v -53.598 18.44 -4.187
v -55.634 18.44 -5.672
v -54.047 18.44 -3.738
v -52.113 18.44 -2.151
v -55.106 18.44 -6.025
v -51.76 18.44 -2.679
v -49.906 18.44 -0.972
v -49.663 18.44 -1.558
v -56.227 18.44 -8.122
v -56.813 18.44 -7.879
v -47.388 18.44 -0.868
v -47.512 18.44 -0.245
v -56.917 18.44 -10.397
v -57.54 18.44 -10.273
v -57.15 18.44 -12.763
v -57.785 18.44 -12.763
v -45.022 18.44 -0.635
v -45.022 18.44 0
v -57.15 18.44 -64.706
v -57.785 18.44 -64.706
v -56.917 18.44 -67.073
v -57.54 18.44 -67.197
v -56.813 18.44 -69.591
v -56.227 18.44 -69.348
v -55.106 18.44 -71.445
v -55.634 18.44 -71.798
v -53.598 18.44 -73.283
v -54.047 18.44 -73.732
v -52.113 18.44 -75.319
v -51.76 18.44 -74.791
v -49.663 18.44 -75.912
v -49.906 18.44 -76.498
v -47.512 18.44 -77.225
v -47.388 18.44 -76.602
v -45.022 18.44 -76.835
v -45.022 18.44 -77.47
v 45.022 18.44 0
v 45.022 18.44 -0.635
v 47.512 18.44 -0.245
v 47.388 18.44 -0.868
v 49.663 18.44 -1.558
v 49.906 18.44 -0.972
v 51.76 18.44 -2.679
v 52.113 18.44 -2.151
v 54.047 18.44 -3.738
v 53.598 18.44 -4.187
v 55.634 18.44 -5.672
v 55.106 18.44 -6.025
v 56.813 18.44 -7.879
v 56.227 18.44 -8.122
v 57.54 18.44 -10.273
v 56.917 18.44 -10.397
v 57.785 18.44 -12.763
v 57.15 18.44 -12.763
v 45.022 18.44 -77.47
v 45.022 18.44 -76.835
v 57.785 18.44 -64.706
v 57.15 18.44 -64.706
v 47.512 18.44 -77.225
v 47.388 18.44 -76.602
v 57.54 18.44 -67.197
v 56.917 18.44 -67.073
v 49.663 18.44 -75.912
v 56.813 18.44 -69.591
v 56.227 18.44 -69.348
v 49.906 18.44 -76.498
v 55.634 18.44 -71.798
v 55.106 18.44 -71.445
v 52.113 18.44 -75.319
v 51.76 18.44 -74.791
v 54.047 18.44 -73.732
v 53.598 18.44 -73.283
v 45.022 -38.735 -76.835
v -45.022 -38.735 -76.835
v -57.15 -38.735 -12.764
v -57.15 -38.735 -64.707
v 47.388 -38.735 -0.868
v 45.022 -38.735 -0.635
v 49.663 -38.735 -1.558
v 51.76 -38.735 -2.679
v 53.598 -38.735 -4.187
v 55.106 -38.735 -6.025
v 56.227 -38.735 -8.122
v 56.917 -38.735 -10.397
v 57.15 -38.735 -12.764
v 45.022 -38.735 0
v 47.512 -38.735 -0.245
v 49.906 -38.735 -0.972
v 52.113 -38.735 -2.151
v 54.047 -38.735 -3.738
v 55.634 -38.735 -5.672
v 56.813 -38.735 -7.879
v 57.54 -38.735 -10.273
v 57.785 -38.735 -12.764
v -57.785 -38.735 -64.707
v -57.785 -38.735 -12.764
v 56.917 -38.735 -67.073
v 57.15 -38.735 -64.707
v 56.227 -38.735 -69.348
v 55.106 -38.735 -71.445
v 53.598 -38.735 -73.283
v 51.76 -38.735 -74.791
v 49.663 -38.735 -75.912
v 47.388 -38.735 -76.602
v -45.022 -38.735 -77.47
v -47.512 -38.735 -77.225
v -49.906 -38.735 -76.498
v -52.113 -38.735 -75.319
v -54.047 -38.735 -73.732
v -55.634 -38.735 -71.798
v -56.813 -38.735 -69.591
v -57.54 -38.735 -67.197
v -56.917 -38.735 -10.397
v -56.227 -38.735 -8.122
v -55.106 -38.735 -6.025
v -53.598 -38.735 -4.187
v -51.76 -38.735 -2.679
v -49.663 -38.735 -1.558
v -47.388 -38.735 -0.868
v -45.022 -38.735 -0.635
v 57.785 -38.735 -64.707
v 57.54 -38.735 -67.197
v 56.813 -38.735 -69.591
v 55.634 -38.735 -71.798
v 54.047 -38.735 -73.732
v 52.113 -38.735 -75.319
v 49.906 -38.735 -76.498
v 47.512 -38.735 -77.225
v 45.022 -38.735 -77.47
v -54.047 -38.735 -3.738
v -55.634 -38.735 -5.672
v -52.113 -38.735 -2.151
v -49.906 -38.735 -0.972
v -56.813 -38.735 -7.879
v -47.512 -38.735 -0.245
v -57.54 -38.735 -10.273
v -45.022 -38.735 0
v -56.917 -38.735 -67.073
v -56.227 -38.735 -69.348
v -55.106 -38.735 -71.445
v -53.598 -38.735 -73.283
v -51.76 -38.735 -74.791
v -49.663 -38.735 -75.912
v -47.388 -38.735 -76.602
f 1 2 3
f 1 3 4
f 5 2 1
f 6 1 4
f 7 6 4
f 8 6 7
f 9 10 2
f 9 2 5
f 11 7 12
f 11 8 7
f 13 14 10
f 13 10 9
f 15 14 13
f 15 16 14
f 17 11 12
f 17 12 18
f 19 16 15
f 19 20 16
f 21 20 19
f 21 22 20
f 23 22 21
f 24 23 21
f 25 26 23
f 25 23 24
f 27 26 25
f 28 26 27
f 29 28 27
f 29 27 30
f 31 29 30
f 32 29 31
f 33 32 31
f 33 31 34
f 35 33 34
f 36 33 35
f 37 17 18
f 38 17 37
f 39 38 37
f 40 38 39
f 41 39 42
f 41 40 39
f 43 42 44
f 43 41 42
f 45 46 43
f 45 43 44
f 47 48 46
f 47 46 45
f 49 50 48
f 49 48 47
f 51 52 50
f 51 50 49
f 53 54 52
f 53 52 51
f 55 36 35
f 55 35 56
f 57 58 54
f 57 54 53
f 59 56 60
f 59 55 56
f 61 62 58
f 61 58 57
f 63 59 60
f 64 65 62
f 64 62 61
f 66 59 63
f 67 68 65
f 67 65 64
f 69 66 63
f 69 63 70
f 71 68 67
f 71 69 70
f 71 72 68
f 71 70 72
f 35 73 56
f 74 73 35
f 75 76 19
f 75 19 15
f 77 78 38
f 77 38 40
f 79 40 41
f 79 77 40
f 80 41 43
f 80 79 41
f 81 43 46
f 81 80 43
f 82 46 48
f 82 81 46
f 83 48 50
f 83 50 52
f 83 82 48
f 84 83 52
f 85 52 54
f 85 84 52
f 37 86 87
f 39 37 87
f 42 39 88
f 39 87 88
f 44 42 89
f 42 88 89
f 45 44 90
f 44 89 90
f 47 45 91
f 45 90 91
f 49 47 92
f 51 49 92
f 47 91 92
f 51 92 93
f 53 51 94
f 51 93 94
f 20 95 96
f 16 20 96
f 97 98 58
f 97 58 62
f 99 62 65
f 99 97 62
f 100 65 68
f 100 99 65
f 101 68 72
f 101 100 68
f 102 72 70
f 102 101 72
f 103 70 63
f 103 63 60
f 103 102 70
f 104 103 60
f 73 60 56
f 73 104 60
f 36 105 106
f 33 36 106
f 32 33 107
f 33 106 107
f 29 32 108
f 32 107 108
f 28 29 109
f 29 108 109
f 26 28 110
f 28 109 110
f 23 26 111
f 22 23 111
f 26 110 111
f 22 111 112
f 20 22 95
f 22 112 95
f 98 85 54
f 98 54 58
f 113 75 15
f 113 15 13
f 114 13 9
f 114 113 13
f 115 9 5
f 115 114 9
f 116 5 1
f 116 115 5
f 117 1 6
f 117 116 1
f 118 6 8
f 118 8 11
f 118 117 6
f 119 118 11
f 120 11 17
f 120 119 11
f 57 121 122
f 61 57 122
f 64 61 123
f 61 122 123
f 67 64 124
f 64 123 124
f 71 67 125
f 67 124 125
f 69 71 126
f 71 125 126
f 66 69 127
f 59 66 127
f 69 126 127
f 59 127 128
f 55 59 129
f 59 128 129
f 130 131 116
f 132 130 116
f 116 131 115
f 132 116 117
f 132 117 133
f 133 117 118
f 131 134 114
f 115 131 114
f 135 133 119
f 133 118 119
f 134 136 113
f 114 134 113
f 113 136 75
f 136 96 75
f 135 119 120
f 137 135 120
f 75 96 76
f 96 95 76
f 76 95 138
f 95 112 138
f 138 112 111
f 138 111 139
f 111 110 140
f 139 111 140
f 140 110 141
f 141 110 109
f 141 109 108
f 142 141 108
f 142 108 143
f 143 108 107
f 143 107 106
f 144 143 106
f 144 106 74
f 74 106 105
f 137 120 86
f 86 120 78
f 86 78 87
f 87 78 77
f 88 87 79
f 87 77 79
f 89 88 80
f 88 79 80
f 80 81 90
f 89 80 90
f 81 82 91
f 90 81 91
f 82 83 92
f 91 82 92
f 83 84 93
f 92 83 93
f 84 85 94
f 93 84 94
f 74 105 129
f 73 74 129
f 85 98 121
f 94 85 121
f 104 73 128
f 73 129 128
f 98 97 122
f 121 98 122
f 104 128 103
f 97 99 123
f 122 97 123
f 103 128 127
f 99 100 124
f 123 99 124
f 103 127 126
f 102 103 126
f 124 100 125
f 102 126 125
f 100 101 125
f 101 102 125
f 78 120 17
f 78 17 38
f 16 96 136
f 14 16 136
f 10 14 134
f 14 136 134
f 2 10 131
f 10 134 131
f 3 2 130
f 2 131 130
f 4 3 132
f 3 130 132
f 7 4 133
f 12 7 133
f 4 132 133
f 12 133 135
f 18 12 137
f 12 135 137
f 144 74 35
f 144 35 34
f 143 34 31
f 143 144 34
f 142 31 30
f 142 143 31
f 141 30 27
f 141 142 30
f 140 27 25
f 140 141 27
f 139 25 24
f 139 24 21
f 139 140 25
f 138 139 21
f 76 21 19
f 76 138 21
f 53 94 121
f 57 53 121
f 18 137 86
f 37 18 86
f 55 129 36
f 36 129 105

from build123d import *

# Parameters (mm, degrees)
F1_DEPTH = 57.1754
F2_T     = -0.635
F3_ANGLE = 90


with BuildPart() as f1:
    # F0 (on Top) → F1 (new body)
    with BuildSketch(Plane.XY):
        with BuildLine():
            ThreePointArc((57.785, 25.9715), (54.046657, 34.996657), (45.0215, 38.735))
            Line((45.0215, 38.735), (-45.0215, 38.735))
            ThreePointArc((-45.0215, 38.735), (-54.046657, 34.996657), (-57.785, 25.9715))
            Line((-57.785, 25.9715), (-57.785, -25.9715))
            ThreePointArc((-57.785, -25.9715), (-54.046657, -34.996657), (-45.0215, -38.735))
            Line((-45.0215, -38.735), (45.0215, -38.735))
            ThreePointArc((45.0215, -38.735), (54.046657, -34.996657), (57.785, -25.9715))
            Line((57.785, -25.9715), (57.785, 25.9715))
        make_face()
    extrude(amount=F1_DEPTH)

    # F2
    f2_openings = [f1.faces().sort_by_distance(p)[0] for p in [
        (0, 0, 57.1754),
        (0, 0, 0),
    ]]
    offset(amount=F2_T, openings=f2_openings)


with BuildPart() as f1_1:
    # F3: moved
    add(f1.part.rotate(Axis((0, -38.735, 0), (-1, 0, 0)), F3_ANGLE))


solid = f1_1.part
